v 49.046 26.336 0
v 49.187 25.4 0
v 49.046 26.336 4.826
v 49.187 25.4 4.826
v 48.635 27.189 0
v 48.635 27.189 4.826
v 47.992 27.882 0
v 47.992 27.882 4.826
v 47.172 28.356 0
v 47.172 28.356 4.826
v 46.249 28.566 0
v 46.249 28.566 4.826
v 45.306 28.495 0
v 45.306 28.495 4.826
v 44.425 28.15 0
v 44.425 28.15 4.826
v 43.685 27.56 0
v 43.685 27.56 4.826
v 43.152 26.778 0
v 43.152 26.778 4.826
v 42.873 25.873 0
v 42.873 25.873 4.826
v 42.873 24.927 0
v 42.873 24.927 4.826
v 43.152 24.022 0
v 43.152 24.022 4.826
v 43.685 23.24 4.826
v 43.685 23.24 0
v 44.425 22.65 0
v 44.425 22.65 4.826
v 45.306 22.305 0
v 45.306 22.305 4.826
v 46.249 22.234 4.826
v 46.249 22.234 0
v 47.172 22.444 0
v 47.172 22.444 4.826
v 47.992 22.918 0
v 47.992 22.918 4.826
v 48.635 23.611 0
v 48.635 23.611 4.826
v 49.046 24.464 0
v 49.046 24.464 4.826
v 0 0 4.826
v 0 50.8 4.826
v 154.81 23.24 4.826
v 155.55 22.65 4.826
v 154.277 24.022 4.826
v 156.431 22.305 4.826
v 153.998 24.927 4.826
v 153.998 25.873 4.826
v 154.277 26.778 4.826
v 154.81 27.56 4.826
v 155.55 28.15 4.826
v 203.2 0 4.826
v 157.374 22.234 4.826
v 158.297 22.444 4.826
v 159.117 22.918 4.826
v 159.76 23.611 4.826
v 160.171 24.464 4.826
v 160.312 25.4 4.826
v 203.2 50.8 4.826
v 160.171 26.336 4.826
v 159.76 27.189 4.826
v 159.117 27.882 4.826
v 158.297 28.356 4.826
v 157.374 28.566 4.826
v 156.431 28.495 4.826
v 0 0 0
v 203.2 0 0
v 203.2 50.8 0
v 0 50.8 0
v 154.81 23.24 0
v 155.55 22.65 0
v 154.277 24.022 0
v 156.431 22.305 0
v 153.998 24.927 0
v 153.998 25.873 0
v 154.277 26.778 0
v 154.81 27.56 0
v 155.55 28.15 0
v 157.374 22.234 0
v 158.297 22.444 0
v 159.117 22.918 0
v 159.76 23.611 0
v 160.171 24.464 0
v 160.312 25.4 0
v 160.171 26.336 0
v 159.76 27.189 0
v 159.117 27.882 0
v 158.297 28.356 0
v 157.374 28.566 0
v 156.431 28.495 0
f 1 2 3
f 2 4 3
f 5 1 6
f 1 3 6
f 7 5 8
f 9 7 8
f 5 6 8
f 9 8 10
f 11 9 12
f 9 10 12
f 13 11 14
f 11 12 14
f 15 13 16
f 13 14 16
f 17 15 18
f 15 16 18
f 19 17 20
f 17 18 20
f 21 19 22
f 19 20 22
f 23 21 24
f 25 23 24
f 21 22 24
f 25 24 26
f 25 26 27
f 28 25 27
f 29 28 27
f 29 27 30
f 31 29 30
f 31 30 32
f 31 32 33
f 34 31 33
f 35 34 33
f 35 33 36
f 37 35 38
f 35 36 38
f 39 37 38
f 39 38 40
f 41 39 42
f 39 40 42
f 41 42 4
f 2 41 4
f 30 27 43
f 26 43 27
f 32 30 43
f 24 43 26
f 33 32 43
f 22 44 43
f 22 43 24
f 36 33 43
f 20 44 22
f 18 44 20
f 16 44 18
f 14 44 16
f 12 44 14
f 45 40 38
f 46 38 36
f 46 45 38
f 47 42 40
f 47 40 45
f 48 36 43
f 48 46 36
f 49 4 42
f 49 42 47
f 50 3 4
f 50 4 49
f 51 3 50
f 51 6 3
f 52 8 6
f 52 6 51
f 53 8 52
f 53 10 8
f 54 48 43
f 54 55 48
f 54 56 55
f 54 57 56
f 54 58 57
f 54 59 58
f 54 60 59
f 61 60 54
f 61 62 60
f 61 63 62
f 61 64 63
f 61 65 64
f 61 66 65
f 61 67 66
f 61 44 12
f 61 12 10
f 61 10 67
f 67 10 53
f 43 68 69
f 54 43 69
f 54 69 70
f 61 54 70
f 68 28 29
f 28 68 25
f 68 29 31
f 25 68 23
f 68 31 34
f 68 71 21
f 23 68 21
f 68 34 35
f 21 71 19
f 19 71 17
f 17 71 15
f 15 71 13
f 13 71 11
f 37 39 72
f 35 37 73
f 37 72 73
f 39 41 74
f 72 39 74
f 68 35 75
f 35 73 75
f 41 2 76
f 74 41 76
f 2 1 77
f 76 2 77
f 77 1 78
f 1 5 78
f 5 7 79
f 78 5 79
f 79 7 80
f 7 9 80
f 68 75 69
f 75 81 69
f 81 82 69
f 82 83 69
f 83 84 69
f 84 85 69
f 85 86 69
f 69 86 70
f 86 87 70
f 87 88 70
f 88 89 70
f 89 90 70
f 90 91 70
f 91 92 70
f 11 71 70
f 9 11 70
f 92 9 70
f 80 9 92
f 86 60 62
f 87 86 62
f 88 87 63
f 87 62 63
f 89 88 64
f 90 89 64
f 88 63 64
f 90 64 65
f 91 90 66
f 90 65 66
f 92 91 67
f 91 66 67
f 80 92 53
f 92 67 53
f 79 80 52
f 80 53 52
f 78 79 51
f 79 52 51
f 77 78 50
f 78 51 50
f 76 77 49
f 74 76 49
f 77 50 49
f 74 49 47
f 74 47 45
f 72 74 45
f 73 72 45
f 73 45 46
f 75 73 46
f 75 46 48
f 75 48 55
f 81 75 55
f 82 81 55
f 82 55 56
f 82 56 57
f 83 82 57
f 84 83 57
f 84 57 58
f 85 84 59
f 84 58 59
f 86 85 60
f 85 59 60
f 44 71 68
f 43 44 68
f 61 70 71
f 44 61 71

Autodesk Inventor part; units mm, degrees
ref_plane "YZ Plane" through (0, 0, 0) normal (1, 0, 0) x (0, 1, 0)
ref_plane "XZ Plane" through (0, 0, 0) normal (0, 1, 0) x (-1, 0, 0)
ref_plane "XY Plane" through (0, 0, 0) normal (0, 0, 1) x (1, 0, 0)
sketch "Sketch1" plane through (0, 0, 0) normal (0, 0, 1) x (1, 0, 0)
  line L0 (0, 0) -> (203.2, 0)
  line L1 (203.2, 0) -> (203.2, 50.8)
  line L2 (203.2, 50.8) -> (0, 50.8)
  line L3 (0, 50.8) -> (0, 0)
  dimension "d0" = 203.2
  dimension "d1" = 50.8
extrude "Extrusion1" add sketch "Sketch1" along normal blind 4.826
sketch "Sketch3" plane through (0, 0, 4.826) normal (0, 0, 1) x (1, 0, 0)
  line L0 (0, 0) -> (203.2, 0) projected
  line L1 (203.2, 50.8) -> (0, 50.8) projected
  circle A0 centre (46.0121, 35.4232) radius 4.2545 projected
  circle A1 centre (157.1371, 35.4232) radius 4.2545 projected
  line L2 (46.0121, 0) -> (46.0121, 50.8) construction
  line L3 (157.1371, 0) -> (157.1371, 50.8) construction
  circle A2 centre (46.0121, 25.4) radius 3.175
  circle A3 centre (157.1371, 25.4) radius 3.175
  dimension "d11" = 6.35
  dimension "d12" = 6.35
extrude "Extrusion2" cut sketch "Sketch3" against normal blind 6.35 contours A2 | A3
equation "\"d13\" = d12"
properties part number "Lower Motor Mount"
